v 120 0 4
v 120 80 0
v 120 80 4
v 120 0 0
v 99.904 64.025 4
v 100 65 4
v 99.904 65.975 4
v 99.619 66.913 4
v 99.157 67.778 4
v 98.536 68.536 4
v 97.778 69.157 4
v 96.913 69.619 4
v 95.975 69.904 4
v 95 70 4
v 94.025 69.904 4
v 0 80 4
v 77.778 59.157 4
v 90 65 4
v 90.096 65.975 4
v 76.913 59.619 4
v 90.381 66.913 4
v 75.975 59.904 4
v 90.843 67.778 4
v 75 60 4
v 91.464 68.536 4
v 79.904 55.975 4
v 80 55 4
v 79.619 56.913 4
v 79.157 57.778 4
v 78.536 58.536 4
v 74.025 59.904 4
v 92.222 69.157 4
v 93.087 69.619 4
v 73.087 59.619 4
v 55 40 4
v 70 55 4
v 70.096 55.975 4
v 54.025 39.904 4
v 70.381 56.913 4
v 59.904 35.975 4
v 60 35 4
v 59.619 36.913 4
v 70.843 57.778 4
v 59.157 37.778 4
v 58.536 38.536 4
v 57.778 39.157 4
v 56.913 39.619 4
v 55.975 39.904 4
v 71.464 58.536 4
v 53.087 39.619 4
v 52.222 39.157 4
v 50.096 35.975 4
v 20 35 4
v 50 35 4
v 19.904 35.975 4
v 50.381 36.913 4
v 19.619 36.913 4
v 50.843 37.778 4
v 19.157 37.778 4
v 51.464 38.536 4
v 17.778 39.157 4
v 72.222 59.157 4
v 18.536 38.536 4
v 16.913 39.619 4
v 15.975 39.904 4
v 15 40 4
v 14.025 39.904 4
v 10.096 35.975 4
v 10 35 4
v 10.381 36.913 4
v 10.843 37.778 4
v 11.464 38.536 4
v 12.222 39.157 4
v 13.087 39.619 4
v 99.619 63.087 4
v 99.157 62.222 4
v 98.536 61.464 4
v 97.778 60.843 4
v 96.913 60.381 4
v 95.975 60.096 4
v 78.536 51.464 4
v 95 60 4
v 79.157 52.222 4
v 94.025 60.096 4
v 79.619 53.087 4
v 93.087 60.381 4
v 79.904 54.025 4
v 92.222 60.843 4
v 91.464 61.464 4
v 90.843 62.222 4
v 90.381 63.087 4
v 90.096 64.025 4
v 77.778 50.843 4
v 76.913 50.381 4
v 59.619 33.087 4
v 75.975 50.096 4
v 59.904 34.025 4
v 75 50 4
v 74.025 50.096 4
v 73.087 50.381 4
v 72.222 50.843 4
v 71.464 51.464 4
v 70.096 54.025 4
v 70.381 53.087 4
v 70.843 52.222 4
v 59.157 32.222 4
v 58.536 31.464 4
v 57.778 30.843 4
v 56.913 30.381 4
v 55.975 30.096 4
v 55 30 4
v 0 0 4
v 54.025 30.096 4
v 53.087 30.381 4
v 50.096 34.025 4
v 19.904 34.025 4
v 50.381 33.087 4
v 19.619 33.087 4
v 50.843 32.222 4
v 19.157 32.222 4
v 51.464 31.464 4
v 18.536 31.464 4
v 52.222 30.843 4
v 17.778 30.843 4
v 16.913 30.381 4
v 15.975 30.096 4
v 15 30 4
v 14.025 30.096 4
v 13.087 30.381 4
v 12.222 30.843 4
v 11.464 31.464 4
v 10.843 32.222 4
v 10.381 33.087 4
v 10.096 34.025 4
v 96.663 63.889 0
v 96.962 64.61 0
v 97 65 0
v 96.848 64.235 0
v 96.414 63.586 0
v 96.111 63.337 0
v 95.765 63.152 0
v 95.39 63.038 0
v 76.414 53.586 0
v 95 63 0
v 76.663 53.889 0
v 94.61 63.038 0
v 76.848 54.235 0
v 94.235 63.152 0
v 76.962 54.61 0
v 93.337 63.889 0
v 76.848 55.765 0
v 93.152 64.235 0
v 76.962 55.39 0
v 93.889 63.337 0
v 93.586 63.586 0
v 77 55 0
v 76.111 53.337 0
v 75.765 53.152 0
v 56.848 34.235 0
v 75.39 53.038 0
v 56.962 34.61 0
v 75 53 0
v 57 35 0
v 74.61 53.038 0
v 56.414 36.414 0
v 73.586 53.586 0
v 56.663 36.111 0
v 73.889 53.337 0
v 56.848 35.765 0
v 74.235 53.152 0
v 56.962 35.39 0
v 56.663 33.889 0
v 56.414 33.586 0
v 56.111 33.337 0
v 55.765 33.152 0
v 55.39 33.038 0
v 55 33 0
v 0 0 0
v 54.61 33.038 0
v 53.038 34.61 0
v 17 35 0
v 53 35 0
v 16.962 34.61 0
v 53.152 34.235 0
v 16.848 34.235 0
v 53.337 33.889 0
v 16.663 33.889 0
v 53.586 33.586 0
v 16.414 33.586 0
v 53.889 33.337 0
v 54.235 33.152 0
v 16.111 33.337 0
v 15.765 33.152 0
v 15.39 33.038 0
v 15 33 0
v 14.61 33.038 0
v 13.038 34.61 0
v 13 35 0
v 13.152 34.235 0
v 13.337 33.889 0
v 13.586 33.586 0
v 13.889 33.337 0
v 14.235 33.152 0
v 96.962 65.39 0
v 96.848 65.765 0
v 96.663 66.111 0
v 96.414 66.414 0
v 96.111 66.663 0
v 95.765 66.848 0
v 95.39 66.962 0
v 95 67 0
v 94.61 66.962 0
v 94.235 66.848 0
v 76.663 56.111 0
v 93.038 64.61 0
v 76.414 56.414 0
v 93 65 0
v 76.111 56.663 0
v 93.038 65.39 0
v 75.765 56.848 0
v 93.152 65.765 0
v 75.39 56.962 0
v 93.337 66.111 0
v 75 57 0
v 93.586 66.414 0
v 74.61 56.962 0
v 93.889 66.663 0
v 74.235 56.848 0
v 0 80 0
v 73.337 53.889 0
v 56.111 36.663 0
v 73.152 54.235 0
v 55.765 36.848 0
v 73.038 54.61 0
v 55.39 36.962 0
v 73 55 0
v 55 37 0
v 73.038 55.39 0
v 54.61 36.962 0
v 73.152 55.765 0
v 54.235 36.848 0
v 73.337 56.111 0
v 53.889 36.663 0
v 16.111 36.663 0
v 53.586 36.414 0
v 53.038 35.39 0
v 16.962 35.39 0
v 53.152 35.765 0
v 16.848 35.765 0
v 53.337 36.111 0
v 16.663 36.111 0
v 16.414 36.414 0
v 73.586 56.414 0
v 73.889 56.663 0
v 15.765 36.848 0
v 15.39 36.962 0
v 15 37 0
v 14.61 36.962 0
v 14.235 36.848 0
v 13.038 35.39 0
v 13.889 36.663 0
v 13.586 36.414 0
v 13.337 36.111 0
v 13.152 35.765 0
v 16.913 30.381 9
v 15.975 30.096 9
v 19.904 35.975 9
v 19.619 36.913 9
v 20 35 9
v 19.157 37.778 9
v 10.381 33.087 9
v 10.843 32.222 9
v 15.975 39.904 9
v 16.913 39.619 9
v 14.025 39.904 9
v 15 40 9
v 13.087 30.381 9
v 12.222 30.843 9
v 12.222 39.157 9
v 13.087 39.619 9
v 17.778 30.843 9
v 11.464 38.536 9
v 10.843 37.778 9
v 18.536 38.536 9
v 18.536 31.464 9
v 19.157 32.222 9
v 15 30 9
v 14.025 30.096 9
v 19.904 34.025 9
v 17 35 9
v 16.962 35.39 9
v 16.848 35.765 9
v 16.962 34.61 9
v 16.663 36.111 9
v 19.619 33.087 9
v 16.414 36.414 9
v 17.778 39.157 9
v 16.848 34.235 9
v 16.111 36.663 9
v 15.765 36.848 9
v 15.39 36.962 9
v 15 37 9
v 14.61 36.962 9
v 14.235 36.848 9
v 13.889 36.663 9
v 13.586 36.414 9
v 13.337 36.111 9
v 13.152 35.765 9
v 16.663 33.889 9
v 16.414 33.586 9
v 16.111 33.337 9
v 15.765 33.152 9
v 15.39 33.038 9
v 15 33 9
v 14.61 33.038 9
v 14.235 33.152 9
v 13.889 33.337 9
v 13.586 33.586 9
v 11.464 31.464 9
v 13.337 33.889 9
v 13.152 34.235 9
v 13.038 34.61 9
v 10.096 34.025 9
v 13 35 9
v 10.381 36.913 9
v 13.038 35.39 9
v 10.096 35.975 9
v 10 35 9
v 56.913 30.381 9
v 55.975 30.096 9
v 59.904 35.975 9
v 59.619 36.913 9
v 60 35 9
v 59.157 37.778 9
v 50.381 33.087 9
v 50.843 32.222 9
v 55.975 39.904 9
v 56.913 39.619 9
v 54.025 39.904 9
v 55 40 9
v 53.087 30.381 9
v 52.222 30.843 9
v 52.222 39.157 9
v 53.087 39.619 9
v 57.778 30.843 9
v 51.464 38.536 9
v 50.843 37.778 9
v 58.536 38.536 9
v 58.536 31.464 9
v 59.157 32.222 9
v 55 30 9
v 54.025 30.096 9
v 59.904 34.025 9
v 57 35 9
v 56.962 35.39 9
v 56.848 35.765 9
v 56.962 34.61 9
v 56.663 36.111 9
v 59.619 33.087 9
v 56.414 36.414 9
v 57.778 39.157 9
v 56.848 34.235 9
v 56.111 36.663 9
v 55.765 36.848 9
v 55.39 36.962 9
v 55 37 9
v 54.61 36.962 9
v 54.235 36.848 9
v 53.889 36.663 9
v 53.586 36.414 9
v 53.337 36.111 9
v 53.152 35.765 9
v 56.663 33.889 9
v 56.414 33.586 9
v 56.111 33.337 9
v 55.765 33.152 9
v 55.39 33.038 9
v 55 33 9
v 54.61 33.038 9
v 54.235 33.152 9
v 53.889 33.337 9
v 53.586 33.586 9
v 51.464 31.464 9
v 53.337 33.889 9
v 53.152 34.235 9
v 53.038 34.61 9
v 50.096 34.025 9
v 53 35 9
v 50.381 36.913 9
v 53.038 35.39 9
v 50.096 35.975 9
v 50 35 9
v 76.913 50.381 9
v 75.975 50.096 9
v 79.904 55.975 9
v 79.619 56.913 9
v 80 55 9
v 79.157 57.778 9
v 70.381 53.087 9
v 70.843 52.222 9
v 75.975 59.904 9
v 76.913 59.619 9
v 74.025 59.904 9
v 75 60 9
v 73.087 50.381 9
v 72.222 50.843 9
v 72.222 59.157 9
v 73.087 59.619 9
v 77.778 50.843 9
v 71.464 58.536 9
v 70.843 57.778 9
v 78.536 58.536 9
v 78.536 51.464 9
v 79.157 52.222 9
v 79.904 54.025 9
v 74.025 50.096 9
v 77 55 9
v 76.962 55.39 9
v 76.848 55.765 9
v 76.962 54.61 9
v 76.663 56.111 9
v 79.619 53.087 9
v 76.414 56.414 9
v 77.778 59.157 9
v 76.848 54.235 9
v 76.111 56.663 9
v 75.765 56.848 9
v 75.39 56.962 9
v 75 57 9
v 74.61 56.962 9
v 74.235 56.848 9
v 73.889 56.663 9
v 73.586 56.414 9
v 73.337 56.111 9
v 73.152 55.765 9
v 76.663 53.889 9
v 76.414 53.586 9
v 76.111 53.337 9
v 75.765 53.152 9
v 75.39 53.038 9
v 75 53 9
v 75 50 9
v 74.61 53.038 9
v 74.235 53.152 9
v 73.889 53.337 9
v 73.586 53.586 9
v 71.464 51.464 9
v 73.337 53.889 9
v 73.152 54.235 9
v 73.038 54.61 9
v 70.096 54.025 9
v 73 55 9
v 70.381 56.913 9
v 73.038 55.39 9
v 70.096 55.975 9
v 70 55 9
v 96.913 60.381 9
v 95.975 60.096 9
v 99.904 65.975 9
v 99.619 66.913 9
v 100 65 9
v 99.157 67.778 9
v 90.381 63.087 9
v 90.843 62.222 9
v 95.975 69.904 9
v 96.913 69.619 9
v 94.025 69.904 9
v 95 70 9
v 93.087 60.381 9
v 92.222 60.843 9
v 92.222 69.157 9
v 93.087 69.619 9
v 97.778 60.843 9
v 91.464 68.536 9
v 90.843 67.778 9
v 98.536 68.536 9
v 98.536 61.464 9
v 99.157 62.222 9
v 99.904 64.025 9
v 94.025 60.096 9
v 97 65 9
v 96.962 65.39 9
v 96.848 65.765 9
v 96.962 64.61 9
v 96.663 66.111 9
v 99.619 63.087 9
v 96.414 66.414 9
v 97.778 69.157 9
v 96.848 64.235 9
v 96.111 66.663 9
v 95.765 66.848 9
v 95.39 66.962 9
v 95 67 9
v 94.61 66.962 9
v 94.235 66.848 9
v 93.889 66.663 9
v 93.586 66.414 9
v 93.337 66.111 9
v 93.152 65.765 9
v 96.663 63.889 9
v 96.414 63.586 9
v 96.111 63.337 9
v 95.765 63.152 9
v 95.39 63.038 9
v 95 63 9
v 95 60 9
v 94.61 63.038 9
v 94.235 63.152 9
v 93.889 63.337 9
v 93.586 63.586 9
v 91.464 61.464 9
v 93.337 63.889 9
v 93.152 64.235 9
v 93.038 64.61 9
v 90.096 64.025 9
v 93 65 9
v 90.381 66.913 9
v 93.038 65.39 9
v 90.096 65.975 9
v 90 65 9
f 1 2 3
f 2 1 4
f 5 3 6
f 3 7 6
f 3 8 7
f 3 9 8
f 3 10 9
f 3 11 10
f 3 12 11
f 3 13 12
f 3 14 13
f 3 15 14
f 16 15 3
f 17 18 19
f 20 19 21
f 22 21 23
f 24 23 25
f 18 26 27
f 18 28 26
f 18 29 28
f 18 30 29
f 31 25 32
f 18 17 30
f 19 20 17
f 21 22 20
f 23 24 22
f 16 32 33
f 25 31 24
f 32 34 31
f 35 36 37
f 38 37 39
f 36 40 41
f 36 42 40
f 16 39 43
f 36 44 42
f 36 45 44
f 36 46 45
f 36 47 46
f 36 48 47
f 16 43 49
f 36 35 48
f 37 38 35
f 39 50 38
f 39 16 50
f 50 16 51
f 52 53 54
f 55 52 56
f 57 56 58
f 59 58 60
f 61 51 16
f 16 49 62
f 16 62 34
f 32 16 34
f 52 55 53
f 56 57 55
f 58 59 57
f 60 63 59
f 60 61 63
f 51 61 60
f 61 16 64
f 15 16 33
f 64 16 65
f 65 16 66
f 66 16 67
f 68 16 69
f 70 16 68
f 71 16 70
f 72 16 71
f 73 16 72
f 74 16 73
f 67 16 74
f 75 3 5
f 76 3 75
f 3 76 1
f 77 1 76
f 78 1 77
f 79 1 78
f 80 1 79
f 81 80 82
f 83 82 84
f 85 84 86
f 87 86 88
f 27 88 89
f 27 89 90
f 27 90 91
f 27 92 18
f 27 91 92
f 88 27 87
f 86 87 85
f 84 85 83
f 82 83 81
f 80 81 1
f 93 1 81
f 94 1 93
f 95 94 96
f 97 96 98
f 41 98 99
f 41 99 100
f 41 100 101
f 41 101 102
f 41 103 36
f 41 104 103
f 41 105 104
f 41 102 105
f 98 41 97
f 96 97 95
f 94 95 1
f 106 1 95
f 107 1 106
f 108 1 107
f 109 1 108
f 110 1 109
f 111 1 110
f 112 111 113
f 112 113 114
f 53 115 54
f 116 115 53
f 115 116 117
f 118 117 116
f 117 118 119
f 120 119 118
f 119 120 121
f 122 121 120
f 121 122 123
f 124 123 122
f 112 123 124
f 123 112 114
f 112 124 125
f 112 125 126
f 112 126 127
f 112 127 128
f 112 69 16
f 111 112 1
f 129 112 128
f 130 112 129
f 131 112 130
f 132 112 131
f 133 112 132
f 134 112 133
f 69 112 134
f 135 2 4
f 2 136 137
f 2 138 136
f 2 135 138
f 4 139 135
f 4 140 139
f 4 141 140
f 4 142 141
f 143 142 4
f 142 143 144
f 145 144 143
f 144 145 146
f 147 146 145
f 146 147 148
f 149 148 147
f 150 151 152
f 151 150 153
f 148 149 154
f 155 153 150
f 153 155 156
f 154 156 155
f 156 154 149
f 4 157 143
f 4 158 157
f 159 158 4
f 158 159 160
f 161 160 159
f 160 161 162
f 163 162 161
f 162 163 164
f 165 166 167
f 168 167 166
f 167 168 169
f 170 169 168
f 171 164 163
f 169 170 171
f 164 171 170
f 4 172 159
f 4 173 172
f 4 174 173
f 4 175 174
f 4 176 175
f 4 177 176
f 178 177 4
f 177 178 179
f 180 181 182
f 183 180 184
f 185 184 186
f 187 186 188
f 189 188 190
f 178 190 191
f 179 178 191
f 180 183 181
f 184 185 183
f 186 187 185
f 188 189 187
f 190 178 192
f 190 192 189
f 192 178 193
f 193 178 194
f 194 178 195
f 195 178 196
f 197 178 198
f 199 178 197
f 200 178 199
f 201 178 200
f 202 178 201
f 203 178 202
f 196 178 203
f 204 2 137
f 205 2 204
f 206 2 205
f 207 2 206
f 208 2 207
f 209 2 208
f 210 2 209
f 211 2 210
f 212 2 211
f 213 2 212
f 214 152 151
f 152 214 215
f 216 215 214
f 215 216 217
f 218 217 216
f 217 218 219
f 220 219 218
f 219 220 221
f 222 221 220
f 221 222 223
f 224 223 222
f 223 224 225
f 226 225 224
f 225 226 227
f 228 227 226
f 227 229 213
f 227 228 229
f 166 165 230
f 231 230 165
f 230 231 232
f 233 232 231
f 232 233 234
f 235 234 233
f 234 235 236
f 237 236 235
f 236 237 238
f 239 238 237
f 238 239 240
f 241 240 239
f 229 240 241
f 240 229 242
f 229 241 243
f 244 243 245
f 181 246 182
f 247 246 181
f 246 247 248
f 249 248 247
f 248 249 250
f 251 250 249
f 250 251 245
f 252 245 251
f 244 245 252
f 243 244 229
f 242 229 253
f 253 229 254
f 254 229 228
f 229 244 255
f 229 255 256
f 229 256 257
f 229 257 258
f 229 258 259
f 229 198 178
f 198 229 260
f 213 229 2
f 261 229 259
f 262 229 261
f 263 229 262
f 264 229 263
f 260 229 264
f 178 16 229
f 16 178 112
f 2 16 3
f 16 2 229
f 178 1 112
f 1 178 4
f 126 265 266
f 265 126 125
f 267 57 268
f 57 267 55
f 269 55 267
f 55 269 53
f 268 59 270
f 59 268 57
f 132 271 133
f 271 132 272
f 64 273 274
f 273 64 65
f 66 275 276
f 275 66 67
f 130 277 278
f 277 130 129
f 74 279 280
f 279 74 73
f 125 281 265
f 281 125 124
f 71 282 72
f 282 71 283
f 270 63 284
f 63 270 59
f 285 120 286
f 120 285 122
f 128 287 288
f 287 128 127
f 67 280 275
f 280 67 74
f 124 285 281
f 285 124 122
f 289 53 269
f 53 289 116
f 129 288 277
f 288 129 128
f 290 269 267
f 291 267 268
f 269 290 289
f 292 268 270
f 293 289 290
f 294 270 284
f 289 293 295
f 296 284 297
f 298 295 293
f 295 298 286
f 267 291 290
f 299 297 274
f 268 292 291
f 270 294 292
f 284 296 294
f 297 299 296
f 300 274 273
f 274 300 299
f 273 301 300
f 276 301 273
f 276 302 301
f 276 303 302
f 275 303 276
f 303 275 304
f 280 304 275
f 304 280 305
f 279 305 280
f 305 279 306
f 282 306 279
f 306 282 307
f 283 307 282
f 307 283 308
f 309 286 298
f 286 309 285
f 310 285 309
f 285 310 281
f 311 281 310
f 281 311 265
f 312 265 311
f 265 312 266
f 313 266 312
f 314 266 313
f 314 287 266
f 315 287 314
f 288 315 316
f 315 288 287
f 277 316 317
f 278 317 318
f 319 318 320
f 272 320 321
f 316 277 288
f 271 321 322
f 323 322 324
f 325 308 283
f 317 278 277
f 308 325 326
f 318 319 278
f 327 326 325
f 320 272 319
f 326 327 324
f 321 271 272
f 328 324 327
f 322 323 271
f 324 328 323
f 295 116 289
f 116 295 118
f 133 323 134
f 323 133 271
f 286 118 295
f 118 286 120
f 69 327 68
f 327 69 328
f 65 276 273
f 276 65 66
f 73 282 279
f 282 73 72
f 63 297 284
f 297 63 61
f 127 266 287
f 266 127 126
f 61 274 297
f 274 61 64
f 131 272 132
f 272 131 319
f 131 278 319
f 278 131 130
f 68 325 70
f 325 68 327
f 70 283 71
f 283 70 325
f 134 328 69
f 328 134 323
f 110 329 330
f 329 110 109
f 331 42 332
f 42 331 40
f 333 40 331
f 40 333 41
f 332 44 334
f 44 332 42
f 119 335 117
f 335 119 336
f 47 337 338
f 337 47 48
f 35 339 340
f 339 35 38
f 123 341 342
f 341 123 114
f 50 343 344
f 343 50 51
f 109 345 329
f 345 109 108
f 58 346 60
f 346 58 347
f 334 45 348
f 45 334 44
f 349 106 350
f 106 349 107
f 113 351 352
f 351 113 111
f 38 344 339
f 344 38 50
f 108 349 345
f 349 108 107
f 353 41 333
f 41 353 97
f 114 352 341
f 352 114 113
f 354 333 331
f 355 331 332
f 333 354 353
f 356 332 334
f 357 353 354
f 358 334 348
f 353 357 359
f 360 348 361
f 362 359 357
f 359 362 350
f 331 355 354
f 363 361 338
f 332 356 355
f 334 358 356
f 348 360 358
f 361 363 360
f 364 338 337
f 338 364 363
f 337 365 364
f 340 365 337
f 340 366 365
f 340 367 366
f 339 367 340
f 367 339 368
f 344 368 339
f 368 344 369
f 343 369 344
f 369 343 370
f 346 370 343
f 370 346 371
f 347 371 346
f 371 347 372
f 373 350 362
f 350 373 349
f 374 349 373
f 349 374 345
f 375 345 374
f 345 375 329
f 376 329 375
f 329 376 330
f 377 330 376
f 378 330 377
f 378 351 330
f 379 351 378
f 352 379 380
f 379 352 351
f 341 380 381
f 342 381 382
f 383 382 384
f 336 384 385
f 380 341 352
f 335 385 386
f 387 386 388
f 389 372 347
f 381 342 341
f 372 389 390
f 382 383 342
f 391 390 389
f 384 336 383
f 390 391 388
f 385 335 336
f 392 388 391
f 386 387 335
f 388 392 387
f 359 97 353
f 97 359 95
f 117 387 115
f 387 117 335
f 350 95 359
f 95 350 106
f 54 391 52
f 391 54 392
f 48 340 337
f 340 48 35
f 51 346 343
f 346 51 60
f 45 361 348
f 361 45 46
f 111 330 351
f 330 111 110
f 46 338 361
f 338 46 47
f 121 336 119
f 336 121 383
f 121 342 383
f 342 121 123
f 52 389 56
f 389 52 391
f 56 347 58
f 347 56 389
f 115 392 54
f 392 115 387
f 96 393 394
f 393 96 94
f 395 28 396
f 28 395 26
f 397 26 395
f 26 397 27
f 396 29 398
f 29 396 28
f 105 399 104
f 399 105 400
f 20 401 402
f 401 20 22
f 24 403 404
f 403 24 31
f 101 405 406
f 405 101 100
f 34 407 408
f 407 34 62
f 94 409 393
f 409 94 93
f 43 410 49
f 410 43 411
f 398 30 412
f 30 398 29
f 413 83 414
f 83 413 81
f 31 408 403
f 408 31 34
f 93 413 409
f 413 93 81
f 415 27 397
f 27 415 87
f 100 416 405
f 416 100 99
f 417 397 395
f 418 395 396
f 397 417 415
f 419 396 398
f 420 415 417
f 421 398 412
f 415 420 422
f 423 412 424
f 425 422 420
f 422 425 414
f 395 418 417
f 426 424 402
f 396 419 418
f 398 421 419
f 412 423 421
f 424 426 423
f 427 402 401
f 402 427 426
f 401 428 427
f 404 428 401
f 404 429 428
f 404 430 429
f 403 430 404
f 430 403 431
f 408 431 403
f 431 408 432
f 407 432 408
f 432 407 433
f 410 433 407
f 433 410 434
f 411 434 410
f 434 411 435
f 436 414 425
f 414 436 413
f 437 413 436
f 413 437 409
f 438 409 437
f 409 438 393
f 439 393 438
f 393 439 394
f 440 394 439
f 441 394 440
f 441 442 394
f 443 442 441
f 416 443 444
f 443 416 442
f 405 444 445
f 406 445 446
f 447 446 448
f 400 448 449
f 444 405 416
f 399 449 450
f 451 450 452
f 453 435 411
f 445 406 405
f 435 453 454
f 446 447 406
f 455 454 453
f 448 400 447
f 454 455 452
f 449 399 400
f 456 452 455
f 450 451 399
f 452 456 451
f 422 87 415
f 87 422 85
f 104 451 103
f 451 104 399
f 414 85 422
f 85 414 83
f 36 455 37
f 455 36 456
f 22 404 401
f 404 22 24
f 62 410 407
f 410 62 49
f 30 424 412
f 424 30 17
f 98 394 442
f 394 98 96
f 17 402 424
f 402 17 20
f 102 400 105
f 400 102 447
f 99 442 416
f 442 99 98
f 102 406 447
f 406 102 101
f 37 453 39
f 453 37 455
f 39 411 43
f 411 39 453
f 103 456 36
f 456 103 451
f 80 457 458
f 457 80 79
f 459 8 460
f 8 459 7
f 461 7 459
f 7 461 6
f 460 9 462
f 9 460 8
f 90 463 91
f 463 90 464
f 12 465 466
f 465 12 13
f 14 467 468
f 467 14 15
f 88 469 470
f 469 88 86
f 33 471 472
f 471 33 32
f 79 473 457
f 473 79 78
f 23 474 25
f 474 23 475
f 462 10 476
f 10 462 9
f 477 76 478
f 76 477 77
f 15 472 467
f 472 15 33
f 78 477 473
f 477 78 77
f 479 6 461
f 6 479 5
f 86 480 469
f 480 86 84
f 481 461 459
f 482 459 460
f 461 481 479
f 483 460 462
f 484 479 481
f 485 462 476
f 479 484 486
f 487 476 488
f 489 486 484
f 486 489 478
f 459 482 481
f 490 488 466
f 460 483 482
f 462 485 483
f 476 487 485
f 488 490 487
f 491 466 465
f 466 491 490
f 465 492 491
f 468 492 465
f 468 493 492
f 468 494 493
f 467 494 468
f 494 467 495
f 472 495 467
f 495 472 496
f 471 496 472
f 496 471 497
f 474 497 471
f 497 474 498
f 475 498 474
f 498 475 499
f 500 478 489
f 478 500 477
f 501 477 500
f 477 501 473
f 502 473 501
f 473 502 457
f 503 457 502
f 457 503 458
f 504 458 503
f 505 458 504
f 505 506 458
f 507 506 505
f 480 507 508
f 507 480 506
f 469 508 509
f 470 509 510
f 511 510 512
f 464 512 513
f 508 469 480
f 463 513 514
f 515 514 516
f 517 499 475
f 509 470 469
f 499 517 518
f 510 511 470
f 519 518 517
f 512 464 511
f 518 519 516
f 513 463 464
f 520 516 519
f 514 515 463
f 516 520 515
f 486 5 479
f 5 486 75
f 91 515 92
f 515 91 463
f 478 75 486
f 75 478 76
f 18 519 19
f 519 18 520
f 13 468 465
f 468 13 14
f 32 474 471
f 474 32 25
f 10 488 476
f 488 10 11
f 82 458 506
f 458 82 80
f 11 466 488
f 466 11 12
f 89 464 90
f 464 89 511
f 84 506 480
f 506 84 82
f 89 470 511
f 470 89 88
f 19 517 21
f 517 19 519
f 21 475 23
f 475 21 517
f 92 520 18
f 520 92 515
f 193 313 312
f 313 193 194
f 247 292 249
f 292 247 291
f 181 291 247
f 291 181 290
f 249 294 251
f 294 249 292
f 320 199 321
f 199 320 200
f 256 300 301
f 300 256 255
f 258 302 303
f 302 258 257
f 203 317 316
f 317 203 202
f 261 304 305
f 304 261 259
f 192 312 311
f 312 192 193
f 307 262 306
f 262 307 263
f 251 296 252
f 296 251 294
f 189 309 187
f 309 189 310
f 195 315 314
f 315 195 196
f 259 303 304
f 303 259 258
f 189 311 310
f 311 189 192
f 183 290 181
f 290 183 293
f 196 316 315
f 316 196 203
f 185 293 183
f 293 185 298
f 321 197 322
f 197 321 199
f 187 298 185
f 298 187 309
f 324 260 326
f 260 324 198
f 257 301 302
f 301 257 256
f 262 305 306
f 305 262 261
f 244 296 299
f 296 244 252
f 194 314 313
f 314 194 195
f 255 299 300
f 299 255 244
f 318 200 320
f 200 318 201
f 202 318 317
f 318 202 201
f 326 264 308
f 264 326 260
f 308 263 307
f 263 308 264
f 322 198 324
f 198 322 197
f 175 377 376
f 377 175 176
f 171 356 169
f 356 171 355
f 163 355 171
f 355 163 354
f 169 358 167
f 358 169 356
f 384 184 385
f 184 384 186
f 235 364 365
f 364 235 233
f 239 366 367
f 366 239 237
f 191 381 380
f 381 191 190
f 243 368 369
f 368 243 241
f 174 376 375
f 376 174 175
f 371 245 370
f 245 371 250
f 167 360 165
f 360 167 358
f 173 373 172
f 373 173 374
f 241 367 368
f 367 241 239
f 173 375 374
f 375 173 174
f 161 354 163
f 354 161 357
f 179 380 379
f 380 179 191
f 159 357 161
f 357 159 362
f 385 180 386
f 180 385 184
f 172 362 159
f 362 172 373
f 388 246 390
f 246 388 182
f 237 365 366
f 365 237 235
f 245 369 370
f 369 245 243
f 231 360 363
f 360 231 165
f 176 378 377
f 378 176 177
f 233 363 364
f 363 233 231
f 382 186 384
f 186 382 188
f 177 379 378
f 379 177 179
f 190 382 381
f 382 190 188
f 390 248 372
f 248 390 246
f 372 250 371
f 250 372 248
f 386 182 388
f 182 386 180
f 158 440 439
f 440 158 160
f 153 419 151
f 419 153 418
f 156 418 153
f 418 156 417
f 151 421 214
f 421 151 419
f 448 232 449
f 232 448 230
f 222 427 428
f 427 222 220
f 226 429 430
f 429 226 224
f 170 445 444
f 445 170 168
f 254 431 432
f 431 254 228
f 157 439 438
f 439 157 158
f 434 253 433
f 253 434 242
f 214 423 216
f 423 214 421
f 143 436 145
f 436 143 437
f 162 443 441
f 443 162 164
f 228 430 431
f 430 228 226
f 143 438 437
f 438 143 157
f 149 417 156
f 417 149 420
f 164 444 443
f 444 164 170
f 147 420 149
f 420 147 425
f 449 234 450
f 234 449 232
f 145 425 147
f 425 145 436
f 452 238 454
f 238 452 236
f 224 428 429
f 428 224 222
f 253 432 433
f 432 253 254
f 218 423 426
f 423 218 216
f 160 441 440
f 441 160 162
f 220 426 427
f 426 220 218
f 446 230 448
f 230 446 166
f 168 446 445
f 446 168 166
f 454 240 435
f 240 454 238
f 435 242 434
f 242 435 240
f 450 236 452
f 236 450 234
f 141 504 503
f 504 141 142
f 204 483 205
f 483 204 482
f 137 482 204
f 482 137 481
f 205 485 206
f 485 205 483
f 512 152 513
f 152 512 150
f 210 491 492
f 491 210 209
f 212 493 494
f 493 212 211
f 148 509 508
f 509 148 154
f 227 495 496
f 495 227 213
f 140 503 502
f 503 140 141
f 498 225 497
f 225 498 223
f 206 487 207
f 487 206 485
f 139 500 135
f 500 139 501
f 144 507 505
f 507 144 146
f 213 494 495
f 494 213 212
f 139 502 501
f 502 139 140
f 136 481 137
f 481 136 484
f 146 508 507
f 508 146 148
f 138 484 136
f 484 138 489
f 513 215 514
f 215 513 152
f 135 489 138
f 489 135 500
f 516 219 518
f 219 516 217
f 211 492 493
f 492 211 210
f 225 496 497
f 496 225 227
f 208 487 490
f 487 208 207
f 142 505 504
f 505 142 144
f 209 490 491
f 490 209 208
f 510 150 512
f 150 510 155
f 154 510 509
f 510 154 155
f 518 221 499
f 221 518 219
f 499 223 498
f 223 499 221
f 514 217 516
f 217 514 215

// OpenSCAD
$fn = 32;

// ----------------------------------------------------------------------
// Boss field: plate with bosses at given coordinates
// ----------------------------------------------------------------------

// --- parameters (mm) ---
plate_l = 120;            // plate length, X
plate_w = 80;             // plate width, Y
plate_t = 4;              // plate thickness, Z
boss_d = 10;              // boss diameter
boss_h = 5;               // boss height above the plate
bore_d = 4;               // boss bore

total_h = plate_t + boss_h;  // overall height

difference() {
  union() {
    cube([plate_l, plate_w, plate_t]);
    translate([15, 35, plate_t]) cylinder(h = boss_h, d = boss_d);
    translate([55, 35, plate_t]) cylinder(h = boss_h, d = boss_d);
    translate([75, 55, plate_t]) cylinder(h = boss_h, d = boss_d);
    translate([95, 65, plate_t]) cylinder(h = boss_h, d = boss_d);
  }
  translate([15, 35, -1]) cylinder(h = total_h + 2, d = bore_d);
  translate([55, 35, -1]) cylinder(h = total_h + 2, d = bore_d);
  translate([75, 55, -1]) cylinder(h = total_h + 2, d = bore_d);
  translate([95, 65, -1]) cylinder(h = total_h + 2, d = bore_d);
}
